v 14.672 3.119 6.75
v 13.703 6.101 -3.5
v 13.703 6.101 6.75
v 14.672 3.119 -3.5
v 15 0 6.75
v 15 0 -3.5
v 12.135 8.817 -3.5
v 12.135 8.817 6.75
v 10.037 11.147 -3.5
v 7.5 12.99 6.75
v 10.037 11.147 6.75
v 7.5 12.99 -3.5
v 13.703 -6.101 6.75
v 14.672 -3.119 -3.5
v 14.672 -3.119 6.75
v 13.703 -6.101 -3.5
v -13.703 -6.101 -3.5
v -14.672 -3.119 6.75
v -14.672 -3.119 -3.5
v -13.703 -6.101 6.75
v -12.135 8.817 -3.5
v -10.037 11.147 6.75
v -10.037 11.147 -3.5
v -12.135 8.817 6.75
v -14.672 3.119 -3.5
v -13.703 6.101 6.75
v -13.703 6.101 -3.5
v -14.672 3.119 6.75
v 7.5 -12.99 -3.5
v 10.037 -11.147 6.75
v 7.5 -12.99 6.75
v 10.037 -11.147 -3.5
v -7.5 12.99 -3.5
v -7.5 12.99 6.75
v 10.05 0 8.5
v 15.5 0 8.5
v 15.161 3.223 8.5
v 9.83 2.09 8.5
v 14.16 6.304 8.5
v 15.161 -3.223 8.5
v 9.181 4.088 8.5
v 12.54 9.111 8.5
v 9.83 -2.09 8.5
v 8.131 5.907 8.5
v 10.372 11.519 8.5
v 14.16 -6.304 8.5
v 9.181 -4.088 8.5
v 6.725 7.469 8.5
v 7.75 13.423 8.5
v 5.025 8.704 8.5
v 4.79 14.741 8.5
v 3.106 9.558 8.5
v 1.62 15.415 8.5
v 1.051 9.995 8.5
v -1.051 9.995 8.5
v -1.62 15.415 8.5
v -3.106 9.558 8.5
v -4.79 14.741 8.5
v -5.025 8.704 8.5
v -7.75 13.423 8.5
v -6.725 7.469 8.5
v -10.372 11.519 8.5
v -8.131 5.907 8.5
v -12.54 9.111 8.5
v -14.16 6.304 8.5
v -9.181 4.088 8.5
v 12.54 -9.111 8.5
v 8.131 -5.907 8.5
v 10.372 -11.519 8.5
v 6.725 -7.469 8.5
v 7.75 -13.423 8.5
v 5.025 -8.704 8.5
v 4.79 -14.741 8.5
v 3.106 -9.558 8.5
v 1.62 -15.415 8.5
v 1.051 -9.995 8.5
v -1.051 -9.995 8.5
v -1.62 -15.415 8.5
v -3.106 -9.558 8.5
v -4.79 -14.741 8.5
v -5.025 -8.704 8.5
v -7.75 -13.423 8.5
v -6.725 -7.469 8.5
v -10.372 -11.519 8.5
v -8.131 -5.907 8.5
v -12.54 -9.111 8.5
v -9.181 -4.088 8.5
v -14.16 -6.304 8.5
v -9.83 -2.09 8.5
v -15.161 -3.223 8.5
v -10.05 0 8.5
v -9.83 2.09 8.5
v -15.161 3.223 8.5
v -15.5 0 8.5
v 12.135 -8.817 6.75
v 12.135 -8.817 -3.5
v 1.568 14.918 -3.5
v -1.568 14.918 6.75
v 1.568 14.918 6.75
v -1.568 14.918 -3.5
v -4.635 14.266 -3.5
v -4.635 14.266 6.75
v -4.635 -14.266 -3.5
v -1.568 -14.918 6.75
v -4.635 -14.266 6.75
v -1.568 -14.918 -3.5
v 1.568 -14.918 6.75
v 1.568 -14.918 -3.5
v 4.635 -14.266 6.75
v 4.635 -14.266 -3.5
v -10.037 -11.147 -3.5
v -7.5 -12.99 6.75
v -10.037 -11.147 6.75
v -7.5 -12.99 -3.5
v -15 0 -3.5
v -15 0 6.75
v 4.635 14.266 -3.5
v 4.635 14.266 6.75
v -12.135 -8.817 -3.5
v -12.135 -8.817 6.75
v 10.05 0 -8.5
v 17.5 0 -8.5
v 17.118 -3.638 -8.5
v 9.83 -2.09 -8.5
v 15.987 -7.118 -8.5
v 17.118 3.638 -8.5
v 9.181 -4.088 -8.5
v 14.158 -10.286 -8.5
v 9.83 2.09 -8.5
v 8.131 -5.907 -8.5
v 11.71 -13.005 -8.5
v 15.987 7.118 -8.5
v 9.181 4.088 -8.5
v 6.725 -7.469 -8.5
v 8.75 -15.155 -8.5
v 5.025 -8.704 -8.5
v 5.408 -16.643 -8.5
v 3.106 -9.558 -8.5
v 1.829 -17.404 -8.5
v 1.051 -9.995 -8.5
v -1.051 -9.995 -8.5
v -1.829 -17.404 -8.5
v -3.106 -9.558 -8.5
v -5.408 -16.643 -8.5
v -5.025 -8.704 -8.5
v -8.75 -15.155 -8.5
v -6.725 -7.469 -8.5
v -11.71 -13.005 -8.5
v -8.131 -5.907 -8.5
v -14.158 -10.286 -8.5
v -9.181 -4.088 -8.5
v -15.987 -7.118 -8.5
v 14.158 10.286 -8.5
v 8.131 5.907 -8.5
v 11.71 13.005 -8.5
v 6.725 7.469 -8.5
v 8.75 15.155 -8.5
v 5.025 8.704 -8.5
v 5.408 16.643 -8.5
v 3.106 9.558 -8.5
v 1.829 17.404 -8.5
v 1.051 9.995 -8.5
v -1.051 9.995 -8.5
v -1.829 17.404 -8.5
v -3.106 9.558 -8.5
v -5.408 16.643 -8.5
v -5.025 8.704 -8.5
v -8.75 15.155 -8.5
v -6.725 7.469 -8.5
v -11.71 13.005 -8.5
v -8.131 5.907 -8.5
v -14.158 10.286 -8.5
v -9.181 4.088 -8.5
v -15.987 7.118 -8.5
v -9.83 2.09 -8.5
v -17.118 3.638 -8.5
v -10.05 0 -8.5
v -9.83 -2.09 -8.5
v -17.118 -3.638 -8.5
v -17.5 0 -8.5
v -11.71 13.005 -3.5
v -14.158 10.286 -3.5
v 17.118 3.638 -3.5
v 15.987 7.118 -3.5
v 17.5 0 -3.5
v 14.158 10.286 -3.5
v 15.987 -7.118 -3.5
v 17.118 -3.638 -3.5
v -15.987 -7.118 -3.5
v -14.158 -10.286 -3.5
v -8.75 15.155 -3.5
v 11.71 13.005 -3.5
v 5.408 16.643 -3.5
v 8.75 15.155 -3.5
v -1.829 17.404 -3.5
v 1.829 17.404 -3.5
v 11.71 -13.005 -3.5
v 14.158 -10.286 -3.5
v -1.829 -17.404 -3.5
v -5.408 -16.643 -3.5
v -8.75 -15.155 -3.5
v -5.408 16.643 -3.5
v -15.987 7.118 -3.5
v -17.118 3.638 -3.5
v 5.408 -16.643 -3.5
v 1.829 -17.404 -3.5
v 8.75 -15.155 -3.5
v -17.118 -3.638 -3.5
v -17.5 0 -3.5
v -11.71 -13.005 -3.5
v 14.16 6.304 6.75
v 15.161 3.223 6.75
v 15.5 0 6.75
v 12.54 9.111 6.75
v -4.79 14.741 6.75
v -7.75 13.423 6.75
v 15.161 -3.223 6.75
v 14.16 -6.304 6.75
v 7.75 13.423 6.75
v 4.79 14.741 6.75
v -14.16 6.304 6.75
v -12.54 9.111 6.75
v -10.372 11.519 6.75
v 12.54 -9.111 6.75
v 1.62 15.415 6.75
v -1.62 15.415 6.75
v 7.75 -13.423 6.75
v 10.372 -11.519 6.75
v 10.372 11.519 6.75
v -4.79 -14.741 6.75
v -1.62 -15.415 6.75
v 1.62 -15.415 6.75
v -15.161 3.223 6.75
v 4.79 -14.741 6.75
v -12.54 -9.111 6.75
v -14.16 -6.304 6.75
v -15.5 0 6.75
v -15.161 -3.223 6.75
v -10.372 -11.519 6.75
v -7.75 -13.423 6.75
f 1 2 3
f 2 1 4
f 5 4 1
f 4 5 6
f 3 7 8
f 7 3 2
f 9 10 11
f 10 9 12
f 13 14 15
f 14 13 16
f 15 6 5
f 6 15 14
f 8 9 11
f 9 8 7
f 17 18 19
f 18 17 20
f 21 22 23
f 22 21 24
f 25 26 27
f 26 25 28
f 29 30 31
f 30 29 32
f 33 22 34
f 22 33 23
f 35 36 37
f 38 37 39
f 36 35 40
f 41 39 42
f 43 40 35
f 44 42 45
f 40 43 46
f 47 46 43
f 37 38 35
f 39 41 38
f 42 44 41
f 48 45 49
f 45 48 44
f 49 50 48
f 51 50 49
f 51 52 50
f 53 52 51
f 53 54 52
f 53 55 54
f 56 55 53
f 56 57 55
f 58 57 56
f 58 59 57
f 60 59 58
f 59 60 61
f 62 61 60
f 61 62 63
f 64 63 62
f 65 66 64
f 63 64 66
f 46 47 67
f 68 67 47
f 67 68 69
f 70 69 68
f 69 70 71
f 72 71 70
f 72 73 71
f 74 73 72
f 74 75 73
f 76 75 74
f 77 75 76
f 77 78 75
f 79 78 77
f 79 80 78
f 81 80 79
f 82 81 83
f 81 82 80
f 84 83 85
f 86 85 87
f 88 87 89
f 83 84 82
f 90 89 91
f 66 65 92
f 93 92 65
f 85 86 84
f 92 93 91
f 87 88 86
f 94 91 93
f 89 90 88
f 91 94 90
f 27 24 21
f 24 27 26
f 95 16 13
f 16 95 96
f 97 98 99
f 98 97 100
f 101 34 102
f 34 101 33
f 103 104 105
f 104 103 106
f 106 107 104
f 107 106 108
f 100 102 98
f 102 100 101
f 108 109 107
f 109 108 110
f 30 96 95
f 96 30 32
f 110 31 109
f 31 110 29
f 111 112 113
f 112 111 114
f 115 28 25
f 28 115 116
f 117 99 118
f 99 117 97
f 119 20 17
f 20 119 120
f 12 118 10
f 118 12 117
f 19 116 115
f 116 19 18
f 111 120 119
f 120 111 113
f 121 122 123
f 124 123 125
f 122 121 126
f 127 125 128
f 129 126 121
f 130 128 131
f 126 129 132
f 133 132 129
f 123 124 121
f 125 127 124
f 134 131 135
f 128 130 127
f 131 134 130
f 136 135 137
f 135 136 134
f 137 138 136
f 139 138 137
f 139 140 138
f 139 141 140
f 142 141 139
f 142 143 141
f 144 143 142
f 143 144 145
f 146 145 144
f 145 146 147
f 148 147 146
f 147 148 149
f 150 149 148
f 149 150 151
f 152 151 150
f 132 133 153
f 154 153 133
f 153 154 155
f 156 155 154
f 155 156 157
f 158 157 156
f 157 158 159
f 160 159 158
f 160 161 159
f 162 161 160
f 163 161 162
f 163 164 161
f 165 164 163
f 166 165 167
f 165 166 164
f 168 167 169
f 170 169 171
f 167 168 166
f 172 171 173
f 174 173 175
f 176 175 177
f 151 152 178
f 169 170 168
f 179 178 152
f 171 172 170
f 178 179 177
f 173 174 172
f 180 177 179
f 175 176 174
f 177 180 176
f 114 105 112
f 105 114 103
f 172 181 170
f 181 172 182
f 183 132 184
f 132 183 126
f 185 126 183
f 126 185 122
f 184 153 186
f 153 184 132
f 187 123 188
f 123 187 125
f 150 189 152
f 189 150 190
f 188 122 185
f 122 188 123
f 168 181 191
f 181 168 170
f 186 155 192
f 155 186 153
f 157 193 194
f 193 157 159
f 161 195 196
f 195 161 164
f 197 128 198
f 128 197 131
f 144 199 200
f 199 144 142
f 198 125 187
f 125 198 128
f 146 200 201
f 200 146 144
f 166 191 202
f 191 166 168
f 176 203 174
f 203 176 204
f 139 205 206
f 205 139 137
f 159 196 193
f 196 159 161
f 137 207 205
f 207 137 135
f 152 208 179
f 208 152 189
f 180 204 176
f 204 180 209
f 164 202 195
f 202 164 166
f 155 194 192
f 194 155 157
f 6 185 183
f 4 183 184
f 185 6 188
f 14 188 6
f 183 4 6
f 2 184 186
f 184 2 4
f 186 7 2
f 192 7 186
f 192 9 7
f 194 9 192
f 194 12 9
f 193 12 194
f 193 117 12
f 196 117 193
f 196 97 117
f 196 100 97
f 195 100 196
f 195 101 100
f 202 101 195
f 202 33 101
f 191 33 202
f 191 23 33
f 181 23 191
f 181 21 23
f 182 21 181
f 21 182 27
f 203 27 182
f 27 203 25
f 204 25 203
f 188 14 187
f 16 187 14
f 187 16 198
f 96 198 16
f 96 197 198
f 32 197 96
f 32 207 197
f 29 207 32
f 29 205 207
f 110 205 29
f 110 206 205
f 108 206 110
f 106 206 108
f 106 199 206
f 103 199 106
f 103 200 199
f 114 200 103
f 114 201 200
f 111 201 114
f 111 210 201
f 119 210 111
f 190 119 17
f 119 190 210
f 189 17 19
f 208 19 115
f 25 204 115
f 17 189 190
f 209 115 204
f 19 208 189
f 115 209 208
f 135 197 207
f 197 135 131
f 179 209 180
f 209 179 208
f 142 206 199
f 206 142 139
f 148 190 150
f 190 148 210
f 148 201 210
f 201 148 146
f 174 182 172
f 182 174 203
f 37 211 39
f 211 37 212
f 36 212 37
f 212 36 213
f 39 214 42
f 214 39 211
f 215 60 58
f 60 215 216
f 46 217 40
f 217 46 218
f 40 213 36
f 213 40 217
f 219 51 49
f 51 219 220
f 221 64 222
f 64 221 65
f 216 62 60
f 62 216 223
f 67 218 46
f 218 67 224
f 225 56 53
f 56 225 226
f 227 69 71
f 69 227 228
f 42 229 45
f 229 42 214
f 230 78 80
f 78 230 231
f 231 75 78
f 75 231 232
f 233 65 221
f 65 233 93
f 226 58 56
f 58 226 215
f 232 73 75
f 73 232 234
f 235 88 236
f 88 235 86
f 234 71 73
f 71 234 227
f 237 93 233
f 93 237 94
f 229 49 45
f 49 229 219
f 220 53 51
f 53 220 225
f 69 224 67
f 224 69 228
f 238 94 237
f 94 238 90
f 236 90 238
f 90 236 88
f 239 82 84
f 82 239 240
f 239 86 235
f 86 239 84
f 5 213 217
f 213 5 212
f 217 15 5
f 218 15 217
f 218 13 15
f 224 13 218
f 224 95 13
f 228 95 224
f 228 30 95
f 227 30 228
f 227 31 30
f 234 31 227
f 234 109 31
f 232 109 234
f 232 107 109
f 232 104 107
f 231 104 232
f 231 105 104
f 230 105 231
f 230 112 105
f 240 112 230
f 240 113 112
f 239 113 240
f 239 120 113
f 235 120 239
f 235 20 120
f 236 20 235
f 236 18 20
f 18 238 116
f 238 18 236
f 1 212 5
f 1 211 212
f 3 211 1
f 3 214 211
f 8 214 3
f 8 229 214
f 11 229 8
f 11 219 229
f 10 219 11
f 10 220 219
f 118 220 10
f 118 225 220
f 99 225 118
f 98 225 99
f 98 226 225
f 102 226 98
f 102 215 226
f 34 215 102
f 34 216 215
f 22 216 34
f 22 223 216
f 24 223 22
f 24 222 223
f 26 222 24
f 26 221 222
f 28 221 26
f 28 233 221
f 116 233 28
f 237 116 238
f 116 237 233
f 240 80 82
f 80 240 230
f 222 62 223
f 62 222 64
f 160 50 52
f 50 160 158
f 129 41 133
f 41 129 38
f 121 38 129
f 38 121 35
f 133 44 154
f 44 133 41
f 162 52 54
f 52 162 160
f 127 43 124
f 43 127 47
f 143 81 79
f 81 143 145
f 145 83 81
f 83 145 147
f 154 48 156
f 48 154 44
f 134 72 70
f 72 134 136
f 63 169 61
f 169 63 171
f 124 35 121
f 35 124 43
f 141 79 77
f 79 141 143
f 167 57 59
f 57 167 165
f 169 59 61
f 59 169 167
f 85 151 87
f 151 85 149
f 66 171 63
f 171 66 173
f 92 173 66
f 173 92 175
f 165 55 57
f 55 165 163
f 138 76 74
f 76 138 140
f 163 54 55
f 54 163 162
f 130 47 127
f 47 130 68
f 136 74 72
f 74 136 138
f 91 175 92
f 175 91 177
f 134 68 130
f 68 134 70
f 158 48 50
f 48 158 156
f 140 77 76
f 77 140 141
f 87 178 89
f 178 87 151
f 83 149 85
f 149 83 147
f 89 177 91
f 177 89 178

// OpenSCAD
// file: spacerUtils.scad
/**
 * @file spacerUtils.scad
 *
 * @version 1.0
 *
 * @author Calum Judd Anderson
 *
 * @brief Aprilia RS 125 2006-2011 spacer utilities
 */
INTERFERENCE_FIT = 0.001;
SLIDE_FIT = 0.05;

SPROCKET_CARRIER_SPACER_HEIGHT = 17;
BRAKE_CARRIER_SPACER_HEIGHT = 15.25;

SPACER_OUTER_RADIUS = 15;
SPINDLE_RADIUS = 10;
SWINGING_ARM_FACE_RADIUS = 17.5;
SWINGING_ARM_FACE_HEIGHT = 5;

CAPTIVE_LIP_HEIGHT = 1.75;
CAPTIVE_LIP_RADIUS = SPACER_OUTER_RADIUS + 0.5;

SPROCKET_CARRIER_INNER_BEARING_SPACER_HEIGHT = 16.5;

SPROCKET_CARRIER_INNER_BEARING_OUTER_RADIUS = 12.475;
SPROCKET_CARRIER_INNER_BEARING_FACE_RADIUS = 16;
SPROCKET_CARRIER_INNER_BEARING_FACE_HEIGHT = 5.55;

/**
 * @brief Aprilia RS 125 2006-2011 rear brake carrier side spacer with captive flange
 */
module brakeCarrierSpacer() {
    difference() {
        union() {
            cylinder(BRAKE_CARRIER_SPACER_HEIGHT, SPACER_OUTER_RADIUS, SPACER_OUTER_RADIUS, center=true);
            translate([0, 0, (-(BRAKE_CARRIER_SPACER_HEIGHT -SWINGING_ARM_FACE_HEIGHT)/2)])
                cylinder(SWINGING_ARM_FACE_HEIGHT, SWINGING_ARM_FACE_RADIUS, SWINGING_ARM_FACE_RADIUS, center=true);
            translate([0, 0, ((BRAKE_CARRIER_SPACER_HEIGHT - CAPTIVE_LIP_HEIGHT)/2)])
                cylinder(CAPTIVE_LIP_HEIGHT, CAPTIVE_LIP_RADIUS, CAPTIVE_LIP_RADIUS, center=true);
        }
        cylinder(BRAKE_CARRIER_SPACER_HEIGHT + INTERFERENCE_FIT, SPINDLE_RADIUS + SLIDE_FIT, SPINDLE_RADIUS + SLIDE_FIT, center=true);
    }
}

/**
 * @brief Aprilia RS 125 2006-2011 rear sprocket carrier side internal spacer
 */
module sprocketCarrierInnerBearingSpacer() {
    difference() {
        union() {
            cylinder(SPROCKET_CARRIER_INNER_BEARING_SPACER_HEIGHT, SPROCKET_CARRIER_INNER_BEARING_OUTER_RADIUS, SPROCKET_CARRIER_INNER_BEARING_OUTER_RADIUS, center=true);
            translate([0, 0, (-(SPROCKET_CARRIER_INNER_BEARING_SPACER_HEIGHT -SPROCKET_CARRIER_INNER_BEARING_FACE_HEIGHT)/2)])
                cylinder(SPROCKET_CARRIER_INNER_BEARING_FACE_HEIGHT, SPROCKET_CARRIER_INNER_BEARING_FACE_RADIUS, SPROCKET_CARRIER_INNER_BEARING_FACE_RADIUS, center=true);
        }
        cylinder(SPROCKET_CARRIER_INNER_BEARING_SPACER_HEIGHT + INTERFERENCE_FIT, SPINDLE_RADIUS + SLIDE_FIT, SPINDLE_RADIUS + SLIDE_FIT, center=true);
    }
}

/**
 * @brief Aprilia RS 125 2006-2011 rear sprocket carrier side spacer with captive flange
 */
module sprocketCarrierSpacer() {
    difference() {
        union() {
            cylinder(SPROCKET_CARRIER_SPACER_HEIGHT, SPACER_OUTER_RADIUS, SPACER_OUTER_RADIUS, center=true);
            translate([0, 0, (-(SPROCKET_CARRIER_SPACER_HEIGHT -SWINGING_ARM_FACE_HEIGHT)/2)])
                cylinder(SWINGING_ARM_FACE_HEIGHT, SWINGING_ARM_FACE_RADIUS, SWINGING_ARM_FACE_RADIUS, center=true);
            translate([0, 0, ((SPROCKET_CARRIER_SPACER_HEIGHT - CAPTIVE_LIP_HEIGHT)/2)])
                cylinder(CAPTIVE_LIP_HEIGHT, CAPTIVE_LIP_RADIUS, CAPTIVE_LIP_RADIUS, center=true);
        }
        cylinder(SPROCKET_CARRIER_SPACER_HEIGHT + INTERFERENCE_FIT, SPINDLE_RADIUS + SLIDE_FIT, SPINDLE_RADIUS + SLIDE_FIT, center=true);
    }
}
// main file
/**
 * @file sprocketCarrierSpacer.scad
 *
 * @version 1.0
 *
 * @author Calum Judd Anderson
 *
 * @brief Aprilia RS 125 2006-2011 rear spindle spacer sprocket carrier side
 */
include <spacerUtils.scad>

sprocketCarrierSpacer();
